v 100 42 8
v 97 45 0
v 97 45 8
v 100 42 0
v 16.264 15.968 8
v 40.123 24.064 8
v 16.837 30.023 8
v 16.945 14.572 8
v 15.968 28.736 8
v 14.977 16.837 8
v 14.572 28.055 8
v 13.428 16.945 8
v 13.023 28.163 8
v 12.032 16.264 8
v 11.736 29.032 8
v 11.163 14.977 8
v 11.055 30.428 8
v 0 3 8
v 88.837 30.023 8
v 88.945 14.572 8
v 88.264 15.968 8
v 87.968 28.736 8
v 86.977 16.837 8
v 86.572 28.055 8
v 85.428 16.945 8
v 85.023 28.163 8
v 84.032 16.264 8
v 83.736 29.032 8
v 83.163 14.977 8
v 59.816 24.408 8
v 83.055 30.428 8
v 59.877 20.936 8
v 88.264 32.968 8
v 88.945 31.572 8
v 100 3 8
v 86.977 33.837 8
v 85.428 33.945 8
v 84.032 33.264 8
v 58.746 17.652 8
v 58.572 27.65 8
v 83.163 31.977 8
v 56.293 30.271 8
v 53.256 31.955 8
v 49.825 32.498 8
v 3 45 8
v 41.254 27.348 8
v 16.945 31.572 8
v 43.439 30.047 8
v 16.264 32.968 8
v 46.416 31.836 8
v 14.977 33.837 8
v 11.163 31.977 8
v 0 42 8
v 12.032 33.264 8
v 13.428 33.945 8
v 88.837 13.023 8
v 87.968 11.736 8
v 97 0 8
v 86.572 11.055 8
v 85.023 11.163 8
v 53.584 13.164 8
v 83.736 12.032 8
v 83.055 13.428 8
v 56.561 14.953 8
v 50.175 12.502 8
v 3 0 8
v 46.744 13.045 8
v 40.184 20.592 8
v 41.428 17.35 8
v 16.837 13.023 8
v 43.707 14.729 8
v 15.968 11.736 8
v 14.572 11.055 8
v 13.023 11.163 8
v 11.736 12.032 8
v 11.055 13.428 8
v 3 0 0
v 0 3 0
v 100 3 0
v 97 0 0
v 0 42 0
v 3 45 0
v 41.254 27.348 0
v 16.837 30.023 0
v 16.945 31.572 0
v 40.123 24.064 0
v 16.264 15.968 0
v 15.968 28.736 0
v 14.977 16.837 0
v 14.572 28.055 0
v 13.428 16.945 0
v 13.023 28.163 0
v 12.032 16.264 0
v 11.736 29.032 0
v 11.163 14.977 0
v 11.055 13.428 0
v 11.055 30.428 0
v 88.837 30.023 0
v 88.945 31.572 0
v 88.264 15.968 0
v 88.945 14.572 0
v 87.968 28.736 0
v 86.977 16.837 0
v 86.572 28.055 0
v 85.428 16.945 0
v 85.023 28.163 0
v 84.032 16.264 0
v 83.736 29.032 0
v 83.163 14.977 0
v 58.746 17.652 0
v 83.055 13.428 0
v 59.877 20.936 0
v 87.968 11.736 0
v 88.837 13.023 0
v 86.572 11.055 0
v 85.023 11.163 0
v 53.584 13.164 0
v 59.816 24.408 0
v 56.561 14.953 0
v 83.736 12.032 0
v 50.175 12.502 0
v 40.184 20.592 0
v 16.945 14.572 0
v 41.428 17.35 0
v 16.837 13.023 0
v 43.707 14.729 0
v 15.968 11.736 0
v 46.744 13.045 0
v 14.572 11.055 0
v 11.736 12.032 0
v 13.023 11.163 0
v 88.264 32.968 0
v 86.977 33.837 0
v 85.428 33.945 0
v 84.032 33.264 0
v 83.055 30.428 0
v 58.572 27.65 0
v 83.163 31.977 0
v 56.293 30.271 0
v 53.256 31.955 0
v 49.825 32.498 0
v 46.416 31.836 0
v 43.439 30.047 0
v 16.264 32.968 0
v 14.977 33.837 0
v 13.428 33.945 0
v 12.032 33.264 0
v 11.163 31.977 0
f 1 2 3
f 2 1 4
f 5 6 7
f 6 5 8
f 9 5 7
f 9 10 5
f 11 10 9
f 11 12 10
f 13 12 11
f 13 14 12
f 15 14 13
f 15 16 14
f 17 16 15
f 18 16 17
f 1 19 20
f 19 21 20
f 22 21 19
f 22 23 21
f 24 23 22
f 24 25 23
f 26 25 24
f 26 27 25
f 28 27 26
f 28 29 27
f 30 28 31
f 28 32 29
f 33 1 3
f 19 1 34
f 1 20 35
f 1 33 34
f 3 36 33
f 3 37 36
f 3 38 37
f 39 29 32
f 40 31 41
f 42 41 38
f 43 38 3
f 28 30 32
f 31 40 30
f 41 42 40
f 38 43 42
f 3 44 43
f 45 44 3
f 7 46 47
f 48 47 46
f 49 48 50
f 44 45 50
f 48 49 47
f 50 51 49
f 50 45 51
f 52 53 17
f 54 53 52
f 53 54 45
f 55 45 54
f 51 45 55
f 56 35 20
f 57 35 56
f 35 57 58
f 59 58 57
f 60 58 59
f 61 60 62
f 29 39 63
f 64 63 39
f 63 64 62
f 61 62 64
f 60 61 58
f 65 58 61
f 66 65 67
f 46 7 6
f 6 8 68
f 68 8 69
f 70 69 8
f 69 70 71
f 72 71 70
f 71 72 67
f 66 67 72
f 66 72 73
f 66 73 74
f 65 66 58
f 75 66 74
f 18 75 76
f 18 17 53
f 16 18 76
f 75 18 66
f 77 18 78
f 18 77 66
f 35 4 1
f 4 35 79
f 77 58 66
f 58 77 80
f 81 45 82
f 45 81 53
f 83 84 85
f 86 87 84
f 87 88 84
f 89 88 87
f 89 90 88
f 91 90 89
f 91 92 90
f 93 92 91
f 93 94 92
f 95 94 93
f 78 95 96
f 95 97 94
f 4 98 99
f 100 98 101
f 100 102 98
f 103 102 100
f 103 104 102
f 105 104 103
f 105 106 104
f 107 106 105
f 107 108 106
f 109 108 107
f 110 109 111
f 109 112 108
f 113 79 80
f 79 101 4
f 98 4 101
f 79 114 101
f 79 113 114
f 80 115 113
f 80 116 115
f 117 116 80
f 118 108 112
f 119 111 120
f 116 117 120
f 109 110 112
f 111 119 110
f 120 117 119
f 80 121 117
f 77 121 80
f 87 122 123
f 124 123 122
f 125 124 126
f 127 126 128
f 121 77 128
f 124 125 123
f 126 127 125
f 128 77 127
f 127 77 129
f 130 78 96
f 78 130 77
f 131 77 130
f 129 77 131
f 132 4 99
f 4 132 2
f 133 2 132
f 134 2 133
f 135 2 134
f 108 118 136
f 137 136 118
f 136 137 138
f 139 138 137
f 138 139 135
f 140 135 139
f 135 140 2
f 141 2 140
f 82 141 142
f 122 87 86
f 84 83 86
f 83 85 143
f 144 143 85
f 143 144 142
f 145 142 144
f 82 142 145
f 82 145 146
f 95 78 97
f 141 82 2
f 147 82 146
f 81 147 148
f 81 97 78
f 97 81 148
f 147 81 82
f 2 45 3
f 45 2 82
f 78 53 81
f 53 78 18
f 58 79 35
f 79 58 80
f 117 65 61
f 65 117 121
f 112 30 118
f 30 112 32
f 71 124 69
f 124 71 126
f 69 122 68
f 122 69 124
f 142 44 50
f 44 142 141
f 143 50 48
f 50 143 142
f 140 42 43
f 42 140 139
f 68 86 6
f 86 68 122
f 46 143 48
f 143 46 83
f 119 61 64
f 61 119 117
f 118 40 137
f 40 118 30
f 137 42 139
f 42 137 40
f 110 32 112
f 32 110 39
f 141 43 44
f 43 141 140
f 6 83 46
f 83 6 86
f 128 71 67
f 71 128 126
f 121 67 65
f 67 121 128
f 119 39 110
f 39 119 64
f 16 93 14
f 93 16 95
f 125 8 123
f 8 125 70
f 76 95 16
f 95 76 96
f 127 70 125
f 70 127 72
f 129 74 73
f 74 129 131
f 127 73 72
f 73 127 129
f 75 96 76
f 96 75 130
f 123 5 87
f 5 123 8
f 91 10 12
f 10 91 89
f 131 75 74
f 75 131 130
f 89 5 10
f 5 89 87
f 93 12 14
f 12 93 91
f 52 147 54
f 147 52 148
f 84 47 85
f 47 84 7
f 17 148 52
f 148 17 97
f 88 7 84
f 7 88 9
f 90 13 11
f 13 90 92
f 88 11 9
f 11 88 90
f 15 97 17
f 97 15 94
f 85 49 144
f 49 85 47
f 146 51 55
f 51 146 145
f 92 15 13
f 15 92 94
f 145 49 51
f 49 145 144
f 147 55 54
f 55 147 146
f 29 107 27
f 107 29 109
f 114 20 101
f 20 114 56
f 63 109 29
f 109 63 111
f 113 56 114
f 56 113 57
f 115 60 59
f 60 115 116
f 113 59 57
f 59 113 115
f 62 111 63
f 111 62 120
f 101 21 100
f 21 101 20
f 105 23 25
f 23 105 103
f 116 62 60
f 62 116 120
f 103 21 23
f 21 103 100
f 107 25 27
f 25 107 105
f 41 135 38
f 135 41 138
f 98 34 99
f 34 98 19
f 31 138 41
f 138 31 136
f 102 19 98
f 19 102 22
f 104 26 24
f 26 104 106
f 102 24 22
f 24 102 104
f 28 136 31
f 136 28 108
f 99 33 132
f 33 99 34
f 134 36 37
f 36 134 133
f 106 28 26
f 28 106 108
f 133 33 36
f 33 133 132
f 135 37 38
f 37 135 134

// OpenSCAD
$fn = 32;

// ----------------------------------------------------------------------
// Spacer plate: rect 100 x 45
// ----------------------------------------------------------------------

// --- parameters (mm) ---
bore_r = 10;              // centre bore radius
bolt_r = 3;               // bolt hole radius
plate_t = 8;              // plate thickness, Z (extrusion height)
plate_l = 100;            // plate length, X
plate_w = 45;             // plate width, Y
inset = 14;               // corner hole inset
fit_tol = 0.02;           // declared fit tolerance (prompt contract)
free_tol = 0.2;           // declared free tolerance (prompt contract)

profile = [[3, 0], [97, 0], [100, 3], [100, 42], [97, 45], [3, 45], [0, 42], [0, 3]];  // primary outline, 8 points, counter clockwise
void_1 = [[59.816, 24.408], [58.572, 27.65], [56.293, 30.271], [53.256, 31.955], [49.825, 32.498], [46.416, 31.836], [43.439, 30.047], [41.254, 27.348], [40.123, 24.064], [40.184, 20.592], [41.428, 17.35], [43.707, 14.729], [46.744, 13.045], [50.175, 12.502], [53.584, 13.164], [56.561, 14.953], [58.746, 17.652], [59.877, 20.936]];  // centre bore, 18 points
void_2 = [[16.945, 14.572], [16.264, 15.968], [14.977, 16.837], [13.428, 16.945], [12.032, 16.264], [11.163, 14.977], [11.055, 13.428], [11.736, 12.032], [13.023, 11.163], [14.572, 11.055], [15.968, 11.736], [16.837, 13.023]];  // corner hole, 12 points
void_3 = [[16.945, 31.572], [16.264, 32.968], [14.977, 33.837], [13.428, 33.945], [12.032, 33.264], [11.163, 31.977], [11.055, 30.428], [11.736, 29.032], [13.023, 28.163], [14.572, 28.055], [15.968, 28.736], [16.837, 30.023]];  // corner hole, 12 points
void_4 = [[88.945, 14.572], [88.264, 15.968], [86.977, 16.837], [85.428, 16.945], [84.032, 16.264], [83.163, 14.977], [83.055, 13.428], [83.736, 12.032], [85.023, 11.163], [86.572, 11.055], [87.968, 11.736], [88.837, 13.023]];  // corner hole, 12 points
void_5 = [[88.945, 31.572], [88.264, 32.968], [86.977, 33.837], [85.428, 33.945], [84.032, 33.264], [83.163, 31.977], [83.055, 30.428], [83.736, 29.032], [85.023, 28.163], [86.572, 28.055], [87.968, 28.736], [88.837, 30.023]];  // corner hole, 12 points

// --- the one profile operation ---
difference() {
  linear_extrude(height = plate_t) polygon(points = profile);
  translate([0, 0, -1])
    linear_extrude(height = plate_t + 2) polygon(points = void_1);
  translate([0, 0, -1])
    linear_extrude(height = plate_t + 2) polygon(points = void_2);
  translate([0, 0, -1])
    linear_extrude(height = plate_t + 2) polygon(points = void_3);
  translate([0, 0, -1])
    linear_extrude(height = plate_t + 2) polygon(points = void_4);
  translate([0, 0, -1])
    linear_extrude(height = plate_t + 2) polygon(points = void_5);
}
